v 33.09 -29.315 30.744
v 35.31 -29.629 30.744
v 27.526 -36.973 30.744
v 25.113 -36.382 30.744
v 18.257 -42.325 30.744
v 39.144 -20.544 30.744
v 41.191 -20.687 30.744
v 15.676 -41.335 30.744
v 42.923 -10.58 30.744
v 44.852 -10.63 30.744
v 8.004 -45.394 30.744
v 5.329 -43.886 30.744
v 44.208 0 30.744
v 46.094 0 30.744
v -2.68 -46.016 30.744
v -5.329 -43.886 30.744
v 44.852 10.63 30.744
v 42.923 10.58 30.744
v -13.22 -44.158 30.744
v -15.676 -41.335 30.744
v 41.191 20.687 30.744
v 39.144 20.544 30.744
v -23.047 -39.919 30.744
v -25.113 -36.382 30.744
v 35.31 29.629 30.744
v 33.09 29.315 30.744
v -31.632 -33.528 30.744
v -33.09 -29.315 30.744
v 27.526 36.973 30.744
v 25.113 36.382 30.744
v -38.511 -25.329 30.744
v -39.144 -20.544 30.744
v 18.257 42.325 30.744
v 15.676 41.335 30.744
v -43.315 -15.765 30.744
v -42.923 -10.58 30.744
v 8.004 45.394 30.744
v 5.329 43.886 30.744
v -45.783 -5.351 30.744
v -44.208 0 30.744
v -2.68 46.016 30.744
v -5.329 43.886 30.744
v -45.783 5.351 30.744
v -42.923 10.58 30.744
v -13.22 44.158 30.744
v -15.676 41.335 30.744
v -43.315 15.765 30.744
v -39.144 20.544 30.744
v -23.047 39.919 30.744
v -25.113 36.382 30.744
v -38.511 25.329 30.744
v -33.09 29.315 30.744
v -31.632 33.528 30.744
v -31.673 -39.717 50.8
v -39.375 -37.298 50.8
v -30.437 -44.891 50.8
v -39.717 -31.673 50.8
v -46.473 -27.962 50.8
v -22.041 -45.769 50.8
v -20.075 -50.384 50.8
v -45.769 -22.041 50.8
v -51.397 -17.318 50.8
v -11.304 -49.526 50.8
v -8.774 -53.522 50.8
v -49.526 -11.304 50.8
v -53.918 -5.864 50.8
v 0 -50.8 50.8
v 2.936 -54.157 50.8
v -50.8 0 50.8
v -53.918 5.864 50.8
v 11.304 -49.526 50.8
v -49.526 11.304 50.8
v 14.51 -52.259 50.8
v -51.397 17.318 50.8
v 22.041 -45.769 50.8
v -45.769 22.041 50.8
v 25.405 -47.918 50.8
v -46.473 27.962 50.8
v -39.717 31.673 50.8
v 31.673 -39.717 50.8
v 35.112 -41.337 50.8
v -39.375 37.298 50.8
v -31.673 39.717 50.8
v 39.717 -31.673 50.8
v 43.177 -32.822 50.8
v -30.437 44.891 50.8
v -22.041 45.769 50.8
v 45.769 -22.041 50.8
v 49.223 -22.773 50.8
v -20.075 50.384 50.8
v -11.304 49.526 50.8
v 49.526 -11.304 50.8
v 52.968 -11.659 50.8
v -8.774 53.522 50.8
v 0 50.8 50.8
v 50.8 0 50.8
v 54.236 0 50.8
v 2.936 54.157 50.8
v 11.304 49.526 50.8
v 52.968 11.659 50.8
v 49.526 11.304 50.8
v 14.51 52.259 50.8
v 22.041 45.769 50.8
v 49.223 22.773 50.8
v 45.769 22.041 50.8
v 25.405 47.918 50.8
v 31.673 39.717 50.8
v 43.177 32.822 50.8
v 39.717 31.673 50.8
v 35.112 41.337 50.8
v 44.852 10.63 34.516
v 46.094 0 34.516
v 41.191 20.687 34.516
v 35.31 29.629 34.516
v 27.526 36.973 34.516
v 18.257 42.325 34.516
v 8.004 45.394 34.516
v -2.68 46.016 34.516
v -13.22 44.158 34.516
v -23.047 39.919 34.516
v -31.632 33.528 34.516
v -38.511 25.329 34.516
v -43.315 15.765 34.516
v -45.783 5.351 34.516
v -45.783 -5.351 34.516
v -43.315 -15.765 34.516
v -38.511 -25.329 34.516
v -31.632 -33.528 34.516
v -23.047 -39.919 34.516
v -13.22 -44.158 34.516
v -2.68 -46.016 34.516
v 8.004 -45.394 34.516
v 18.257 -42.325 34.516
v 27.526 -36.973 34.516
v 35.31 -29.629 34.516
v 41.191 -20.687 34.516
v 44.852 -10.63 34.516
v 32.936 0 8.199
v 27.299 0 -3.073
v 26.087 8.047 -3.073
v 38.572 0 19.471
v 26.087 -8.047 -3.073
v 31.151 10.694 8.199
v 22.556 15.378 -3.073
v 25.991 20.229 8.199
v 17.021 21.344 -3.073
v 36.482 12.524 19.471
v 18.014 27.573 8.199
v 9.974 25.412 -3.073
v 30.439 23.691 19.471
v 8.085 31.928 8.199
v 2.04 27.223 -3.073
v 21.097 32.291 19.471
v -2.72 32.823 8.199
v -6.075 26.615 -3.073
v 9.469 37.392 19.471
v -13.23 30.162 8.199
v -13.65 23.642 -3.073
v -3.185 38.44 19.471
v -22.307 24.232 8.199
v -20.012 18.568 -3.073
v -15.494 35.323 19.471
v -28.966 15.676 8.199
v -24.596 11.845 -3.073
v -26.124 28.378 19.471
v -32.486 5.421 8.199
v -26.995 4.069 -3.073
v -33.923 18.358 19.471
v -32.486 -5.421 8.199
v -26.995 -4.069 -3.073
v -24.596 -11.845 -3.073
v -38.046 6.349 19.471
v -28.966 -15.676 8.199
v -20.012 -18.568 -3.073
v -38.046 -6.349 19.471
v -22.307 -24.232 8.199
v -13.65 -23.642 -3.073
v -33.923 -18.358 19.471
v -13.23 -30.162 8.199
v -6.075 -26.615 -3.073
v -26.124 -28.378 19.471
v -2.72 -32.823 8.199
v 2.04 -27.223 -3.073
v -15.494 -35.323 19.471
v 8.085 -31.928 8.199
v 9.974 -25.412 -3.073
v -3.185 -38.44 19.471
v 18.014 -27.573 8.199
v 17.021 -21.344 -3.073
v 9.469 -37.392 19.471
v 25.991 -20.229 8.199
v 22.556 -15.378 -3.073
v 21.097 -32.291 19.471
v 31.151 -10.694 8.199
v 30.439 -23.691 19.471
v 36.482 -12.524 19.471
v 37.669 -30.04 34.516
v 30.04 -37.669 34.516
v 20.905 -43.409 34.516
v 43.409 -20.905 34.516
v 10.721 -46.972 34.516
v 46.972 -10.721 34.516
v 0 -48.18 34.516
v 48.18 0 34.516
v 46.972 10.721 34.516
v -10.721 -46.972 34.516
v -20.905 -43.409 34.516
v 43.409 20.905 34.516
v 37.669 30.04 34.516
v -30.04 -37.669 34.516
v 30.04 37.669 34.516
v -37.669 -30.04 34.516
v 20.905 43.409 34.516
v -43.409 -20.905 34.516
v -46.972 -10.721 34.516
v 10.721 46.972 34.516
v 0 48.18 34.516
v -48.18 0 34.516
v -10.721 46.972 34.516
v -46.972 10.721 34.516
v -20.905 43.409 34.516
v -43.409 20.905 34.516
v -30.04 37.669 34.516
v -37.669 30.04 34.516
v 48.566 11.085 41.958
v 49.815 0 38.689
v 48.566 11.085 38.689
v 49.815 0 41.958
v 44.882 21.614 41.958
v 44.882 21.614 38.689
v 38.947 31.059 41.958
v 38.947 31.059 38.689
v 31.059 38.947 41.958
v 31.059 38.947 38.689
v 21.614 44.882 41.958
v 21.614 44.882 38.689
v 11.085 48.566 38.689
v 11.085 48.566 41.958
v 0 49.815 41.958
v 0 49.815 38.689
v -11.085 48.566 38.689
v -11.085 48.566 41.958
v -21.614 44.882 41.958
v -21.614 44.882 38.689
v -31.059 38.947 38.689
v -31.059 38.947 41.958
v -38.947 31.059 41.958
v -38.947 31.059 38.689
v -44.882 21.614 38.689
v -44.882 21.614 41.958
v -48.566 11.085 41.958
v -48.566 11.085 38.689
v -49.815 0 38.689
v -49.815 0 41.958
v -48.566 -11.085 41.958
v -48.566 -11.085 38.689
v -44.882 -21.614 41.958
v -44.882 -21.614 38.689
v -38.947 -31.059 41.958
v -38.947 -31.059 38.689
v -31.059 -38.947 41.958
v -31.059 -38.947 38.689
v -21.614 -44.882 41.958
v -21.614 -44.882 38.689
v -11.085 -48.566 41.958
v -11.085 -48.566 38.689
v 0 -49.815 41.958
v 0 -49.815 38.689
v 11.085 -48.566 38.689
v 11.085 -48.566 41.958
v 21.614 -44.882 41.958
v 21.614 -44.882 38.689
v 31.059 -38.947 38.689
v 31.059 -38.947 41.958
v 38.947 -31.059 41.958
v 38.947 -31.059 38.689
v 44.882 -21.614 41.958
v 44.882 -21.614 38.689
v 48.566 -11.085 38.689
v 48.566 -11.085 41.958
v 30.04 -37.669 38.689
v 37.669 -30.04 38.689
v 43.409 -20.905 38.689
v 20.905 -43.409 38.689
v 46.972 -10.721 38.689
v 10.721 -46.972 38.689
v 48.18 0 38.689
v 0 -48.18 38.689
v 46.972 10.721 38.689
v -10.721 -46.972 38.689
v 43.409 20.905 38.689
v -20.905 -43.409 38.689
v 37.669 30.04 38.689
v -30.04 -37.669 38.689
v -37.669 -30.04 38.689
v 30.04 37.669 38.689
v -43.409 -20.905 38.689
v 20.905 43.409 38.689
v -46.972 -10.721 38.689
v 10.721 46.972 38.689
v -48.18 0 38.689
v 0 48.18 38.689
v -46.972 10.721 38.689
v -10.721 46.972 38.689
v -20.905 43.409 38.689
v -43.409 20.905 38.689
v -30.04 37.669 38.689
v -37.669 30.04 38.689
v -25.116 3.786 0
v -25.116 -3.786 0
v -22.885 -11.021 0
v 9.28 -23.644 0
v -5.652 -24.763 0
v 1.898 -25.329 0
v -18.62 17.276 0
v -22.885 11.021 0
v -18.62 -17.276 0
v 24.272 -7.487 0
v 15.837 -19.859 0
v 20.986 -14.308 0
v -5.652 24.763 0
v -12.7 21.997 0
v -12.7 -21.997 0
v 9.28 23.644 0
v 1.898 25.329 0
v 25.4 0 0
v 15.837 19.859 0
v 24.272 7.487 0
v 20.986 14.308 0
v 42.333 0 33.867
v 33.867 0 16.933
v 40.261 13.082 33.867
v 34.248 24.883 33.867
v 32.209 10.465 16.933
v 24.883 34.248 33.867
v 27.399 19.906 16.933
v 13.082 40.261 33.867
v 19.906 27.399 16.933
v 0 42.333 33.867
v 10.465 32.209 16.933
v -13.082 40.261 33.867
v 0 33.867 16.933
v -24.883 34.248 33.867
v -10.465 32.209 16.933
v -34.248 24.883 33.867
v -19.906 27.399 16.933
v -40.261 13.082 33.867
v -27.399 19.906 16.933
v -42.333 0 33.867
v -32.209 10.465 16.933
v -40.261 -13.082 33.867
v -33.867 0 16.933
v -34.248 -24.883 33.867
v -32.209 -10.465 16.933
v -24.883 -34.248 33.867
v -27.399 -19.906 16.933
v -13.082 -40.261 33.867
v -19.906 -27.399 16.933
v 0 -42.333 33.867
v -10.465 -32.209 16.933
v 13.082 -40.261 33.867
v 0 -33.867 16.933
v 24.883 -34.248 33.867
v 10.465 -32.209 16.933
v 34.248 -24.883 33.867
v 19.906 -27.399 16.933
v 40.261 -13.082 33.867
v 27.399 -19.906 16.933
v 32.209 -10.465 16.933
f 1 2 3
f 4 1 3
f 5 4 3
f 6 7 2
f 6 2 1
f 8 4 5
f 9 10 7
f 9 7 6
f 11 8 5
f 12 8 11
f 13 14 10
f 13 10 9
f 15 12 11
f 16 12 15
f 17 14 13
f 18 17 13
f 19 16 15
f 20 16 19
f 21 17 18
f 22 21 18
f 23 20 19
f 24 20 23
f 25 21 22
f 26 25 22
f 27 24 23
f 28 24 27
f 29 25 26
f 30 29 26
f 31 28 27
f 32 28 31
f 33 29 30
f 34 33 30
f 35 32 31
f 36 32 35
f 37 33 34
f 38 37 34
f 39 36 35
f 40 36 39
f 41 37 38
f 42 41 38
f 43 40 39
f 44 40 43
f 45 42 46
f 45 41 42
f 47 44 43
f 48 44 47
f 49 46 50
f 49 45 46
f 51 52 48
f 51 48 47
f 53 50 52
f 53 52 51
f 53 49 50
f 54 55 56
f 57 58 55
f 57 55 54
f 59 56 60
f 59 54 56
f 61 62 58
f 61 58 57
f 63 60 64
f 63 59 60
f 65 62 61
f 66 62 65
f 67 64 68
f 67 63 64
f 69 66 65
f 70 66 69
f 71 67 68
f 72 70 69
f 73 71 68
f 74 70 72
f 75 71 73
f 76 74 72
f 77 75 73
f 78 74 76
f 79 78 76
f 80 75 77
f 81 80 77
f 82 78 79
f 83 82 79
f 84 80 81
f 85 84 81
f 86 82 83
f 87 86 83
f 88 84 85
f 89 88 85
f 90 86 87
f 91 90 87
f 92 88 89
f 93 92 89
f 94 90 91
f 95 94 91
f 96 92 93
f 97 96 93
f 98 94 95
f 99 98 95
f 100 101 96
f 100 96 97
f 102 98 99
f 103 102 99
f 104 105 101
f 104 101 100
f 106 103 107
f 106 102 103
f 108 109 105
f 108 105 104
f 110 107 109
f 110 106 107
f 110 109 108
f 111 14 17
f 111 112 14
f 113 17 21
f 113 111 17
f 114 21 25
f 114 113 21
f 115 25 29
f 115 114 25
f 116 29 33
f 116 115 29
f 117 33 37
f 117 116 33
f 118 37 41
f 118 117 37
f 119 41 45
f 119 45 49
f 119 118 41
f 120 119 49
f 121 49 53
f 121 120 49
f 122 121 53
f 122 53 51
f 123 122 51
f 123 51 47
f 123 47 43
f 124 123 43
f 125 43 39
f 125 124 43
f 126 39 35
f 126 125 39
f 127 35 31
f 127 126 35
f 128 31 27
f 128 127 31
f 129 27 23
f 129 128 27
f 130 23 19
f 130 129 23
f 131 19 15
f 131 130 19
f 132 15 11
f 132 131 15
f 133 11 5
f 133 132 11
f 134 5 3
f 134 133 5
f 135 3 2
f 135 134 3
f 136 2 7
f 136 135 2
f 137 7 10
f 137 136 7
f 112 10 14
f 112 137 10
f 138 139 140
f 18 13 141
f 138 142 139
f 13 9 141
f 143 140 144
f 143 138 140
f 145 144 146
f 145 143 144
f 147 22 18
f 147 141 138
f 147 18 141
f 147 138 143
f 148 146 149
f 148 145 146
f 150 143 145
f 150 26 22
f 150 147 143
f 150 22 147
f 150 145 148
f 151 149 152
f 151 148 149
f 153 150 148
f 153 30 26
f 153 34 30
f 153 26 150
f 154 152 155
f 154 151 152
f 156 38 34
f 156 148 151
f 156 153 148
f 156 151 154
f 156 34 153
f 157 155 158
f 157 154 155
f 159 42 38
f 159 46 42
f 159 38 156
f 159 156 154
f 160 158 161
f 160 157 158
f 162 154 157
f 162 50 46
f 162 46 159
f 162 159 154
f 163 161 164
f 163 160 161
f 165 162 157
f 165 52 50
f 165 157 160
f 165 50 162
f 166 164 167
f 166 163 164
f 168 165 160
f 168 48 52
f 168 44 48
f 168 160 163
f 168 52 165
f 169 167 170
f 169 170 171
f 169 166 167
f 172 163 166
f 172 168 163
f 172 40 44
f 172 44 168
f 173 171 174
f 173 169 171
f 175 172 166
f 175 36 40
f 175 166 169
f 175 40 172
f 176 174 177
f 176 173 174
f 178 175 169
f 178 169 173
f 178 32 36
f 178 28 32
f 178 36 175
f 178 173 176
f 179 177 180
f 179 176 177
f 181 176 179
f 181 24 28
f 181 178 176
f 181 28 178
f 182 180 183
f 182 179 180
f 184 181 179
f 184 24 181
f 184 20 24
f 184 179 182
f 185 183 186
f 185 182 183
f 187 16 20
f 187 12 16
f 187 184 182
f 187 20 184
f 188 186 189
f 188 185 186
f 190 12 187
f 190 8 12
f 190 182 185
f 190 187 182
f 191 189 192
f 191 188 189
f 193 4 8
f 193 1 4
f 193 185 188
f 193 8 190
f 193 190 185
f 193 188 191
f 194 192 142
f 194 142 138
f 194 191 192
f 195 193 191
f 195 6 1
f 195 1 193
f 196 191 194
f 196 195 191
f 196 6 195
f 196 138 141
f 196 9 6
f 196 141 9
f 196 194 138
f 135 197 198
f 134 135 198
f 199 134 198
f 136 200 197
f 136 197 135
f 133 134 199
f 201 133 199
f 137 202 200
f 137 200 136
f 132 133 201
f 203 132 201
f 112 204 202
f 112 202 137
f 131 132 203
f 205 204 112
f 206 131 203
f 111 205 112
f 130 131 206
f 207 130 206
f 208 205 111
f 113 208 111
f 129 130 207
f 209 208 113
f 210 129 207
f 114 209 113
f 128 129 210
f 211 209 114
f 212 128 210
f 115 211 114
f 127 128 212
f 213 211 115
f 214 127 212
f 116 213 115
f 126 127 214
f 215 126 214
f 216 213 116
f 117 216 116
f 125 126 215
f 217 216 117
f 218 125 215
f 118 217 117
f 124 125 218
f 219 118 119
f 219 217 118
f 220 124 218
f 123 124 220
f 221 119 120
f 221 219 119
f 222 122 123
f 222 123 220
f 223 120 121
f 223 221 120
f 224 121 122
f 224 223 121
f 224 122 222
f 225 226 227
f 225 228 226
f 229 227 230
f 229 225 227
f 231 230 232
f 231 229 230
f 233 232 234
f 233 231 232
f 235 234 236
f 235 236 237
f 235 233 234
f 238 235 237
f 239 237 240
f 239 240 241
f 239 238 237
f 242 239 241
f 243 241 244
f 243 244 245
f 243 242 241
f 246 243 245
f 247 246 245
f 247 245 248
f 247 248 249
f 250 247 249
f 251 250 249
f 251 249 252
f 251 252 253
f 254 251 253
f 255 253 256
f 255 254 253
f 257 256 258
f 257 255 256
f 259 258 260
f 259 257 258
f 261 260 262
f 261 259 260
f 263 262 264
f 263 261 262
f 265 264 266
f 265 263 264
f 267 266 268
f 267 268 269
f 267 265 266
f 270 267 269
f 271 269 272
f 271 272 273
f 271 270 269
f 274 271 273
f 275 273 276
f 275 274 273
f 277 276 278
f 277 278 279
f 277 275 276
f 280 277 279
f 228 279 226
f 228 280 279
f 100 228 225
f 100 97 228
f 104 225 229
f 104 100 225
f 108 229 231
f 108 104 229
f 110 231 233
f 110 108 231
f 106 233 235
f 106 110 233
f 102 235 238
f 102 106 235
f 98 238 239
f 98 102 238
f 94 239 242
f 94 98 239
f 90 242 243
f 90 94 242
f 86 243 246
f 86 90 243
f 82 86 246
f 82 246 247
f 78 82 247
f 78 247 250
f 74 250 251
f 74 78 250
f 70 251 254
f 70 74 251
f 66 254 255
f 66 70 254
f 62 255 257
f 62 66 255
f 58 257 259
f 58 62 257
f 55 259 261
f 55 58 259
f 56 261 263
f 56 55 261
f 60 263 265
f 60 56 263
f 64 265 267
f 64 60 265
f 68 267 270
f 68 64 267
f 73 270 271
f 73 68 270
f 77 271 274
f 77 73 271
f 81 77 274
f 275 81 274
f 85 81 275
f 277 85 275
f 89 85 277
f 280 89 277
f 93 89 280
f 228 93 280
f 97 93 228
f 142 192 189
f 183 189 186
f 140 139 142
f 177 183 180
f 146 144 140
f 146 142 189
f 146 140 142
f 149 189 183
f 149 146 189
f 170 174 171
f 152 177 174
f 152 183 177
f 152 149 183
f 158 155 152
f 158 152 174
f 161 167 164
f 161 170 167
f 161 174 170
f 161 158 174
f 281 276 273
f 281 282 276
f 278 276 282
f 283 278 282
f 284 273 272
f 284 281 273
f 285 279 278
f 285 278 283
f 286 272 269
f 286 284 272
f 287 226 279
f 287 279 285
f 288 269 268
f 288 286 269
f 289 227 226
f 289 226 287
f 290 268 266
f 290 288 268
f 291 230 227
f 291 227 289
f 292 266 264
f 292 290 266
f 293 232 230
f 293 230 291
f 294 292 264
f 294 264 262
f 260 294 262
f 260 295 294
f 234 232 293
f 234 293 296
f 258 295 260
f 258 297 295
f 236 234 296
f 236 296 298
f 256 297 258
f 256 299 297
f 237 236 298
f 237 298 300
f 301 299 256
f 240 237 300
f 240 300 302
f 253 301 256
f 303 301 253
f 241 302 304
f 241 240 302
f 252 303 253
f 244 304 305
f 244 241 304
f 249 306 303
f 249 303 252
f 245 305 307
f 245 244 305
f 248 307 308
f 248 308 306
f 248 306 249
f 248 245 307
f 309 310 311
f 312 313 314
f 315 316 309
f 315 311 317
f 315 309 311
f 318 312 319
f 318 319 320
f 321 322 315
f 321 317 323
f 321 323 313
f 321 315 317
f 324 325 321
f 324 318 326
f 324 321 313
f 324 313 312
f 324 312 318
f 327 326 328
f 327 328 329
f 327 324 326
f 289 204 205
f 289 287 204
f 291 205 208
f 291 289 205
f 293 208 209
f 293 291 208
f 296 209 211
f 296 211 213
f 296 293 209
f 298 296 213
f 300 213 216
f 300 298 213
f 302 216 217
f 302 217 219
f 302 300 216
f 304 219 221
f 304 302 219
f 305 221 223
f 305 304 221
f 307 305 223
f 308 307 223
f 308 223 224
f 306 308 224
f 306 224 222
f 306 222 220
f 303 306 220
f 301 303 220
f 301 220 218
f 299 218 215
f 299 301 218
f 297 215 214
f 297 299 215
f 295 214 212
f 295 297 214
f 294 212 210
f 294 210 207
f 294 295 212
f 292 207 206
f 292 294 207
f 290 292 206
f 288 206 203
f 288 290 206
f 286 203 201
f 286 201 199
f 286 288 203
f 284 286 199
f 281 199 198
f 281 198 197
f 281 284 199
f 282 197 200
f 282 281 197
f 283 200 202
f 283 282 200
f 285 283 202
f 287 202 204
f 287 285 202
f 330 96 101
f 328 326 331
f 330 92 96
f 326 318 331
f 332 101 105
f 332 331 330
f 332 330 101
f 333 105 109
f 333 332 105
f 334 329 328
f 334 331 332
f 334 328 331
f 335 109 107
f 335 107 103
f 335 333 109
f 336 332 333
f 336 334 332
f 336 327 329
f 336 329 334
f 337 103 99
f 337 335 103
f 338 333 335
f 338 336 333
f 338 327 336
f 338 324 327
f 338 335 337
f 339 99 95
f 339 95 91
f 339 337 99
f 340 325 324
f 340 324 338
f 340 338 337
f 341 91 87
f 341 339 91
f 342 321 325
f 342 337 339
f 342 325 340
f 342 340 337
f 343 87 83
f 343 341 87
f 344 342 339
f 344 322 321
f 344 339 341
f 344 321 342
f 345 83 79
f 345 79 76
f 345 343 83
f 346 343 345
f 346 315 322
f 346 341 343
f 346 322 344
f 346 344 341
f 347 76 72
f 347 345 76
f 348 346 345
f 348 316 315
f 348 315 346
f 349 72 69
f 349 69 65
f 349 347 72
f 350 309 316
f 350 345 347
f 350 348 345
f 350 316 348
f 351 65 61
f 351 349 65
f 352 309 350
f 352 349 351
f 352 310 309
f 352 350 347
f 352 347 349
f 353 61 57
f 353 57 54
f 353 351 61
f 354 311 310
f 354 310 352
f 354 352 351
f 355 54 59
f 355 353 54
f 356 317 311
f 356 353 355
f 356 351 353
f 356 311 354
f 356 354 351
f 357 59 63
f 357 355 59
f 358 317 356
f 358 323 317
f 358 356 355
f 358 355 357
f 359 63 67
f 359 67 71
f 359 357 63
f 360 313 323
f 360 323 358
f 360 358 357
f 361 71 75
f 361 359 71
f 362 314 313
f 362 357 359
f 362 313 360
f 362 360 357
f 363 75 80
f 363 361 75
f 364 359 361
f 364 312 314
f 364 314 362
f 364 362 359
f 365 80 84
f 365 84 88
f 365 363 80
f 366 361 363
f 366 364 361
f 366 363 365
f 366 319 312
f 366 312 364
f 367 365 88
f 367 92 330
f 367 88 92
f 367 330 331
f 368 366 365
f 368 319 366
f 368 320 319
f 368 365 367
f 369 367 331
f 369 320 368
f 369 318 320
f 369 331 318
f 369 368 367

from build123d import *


with BuildPart() as f1:
    # F0 (on Front) → F1 (revolve)
    with BuildSketch(Plane.XZ):
        Polygon((25.4, 0), (0, 0), (0, -3.0734), (27.299466, -3.0734), (44.208006, 30.743681), (46.09435, 34.516368), (48.180423, 38.688514), (49.815372, 41.958412), (54.236166, 50.8), (50.8, 50.8), align=None)
        Polygon((46.09435, 34.516368), (44.208006, 30.743681), (46.09435, 30.743681), align=None)
        Polygon((48.180423, 38.688514), (46.09435, 34.516368), (48.180423, 34.516368), align=None)
        Polygon((49.815372, 38.688514), (49.815372, 41.958412), (48.180423, 38.688514), align=None)
    revolve(axis=Axis((0, 0, 25.4), (0, 0, 1)))


solid = f1.part
